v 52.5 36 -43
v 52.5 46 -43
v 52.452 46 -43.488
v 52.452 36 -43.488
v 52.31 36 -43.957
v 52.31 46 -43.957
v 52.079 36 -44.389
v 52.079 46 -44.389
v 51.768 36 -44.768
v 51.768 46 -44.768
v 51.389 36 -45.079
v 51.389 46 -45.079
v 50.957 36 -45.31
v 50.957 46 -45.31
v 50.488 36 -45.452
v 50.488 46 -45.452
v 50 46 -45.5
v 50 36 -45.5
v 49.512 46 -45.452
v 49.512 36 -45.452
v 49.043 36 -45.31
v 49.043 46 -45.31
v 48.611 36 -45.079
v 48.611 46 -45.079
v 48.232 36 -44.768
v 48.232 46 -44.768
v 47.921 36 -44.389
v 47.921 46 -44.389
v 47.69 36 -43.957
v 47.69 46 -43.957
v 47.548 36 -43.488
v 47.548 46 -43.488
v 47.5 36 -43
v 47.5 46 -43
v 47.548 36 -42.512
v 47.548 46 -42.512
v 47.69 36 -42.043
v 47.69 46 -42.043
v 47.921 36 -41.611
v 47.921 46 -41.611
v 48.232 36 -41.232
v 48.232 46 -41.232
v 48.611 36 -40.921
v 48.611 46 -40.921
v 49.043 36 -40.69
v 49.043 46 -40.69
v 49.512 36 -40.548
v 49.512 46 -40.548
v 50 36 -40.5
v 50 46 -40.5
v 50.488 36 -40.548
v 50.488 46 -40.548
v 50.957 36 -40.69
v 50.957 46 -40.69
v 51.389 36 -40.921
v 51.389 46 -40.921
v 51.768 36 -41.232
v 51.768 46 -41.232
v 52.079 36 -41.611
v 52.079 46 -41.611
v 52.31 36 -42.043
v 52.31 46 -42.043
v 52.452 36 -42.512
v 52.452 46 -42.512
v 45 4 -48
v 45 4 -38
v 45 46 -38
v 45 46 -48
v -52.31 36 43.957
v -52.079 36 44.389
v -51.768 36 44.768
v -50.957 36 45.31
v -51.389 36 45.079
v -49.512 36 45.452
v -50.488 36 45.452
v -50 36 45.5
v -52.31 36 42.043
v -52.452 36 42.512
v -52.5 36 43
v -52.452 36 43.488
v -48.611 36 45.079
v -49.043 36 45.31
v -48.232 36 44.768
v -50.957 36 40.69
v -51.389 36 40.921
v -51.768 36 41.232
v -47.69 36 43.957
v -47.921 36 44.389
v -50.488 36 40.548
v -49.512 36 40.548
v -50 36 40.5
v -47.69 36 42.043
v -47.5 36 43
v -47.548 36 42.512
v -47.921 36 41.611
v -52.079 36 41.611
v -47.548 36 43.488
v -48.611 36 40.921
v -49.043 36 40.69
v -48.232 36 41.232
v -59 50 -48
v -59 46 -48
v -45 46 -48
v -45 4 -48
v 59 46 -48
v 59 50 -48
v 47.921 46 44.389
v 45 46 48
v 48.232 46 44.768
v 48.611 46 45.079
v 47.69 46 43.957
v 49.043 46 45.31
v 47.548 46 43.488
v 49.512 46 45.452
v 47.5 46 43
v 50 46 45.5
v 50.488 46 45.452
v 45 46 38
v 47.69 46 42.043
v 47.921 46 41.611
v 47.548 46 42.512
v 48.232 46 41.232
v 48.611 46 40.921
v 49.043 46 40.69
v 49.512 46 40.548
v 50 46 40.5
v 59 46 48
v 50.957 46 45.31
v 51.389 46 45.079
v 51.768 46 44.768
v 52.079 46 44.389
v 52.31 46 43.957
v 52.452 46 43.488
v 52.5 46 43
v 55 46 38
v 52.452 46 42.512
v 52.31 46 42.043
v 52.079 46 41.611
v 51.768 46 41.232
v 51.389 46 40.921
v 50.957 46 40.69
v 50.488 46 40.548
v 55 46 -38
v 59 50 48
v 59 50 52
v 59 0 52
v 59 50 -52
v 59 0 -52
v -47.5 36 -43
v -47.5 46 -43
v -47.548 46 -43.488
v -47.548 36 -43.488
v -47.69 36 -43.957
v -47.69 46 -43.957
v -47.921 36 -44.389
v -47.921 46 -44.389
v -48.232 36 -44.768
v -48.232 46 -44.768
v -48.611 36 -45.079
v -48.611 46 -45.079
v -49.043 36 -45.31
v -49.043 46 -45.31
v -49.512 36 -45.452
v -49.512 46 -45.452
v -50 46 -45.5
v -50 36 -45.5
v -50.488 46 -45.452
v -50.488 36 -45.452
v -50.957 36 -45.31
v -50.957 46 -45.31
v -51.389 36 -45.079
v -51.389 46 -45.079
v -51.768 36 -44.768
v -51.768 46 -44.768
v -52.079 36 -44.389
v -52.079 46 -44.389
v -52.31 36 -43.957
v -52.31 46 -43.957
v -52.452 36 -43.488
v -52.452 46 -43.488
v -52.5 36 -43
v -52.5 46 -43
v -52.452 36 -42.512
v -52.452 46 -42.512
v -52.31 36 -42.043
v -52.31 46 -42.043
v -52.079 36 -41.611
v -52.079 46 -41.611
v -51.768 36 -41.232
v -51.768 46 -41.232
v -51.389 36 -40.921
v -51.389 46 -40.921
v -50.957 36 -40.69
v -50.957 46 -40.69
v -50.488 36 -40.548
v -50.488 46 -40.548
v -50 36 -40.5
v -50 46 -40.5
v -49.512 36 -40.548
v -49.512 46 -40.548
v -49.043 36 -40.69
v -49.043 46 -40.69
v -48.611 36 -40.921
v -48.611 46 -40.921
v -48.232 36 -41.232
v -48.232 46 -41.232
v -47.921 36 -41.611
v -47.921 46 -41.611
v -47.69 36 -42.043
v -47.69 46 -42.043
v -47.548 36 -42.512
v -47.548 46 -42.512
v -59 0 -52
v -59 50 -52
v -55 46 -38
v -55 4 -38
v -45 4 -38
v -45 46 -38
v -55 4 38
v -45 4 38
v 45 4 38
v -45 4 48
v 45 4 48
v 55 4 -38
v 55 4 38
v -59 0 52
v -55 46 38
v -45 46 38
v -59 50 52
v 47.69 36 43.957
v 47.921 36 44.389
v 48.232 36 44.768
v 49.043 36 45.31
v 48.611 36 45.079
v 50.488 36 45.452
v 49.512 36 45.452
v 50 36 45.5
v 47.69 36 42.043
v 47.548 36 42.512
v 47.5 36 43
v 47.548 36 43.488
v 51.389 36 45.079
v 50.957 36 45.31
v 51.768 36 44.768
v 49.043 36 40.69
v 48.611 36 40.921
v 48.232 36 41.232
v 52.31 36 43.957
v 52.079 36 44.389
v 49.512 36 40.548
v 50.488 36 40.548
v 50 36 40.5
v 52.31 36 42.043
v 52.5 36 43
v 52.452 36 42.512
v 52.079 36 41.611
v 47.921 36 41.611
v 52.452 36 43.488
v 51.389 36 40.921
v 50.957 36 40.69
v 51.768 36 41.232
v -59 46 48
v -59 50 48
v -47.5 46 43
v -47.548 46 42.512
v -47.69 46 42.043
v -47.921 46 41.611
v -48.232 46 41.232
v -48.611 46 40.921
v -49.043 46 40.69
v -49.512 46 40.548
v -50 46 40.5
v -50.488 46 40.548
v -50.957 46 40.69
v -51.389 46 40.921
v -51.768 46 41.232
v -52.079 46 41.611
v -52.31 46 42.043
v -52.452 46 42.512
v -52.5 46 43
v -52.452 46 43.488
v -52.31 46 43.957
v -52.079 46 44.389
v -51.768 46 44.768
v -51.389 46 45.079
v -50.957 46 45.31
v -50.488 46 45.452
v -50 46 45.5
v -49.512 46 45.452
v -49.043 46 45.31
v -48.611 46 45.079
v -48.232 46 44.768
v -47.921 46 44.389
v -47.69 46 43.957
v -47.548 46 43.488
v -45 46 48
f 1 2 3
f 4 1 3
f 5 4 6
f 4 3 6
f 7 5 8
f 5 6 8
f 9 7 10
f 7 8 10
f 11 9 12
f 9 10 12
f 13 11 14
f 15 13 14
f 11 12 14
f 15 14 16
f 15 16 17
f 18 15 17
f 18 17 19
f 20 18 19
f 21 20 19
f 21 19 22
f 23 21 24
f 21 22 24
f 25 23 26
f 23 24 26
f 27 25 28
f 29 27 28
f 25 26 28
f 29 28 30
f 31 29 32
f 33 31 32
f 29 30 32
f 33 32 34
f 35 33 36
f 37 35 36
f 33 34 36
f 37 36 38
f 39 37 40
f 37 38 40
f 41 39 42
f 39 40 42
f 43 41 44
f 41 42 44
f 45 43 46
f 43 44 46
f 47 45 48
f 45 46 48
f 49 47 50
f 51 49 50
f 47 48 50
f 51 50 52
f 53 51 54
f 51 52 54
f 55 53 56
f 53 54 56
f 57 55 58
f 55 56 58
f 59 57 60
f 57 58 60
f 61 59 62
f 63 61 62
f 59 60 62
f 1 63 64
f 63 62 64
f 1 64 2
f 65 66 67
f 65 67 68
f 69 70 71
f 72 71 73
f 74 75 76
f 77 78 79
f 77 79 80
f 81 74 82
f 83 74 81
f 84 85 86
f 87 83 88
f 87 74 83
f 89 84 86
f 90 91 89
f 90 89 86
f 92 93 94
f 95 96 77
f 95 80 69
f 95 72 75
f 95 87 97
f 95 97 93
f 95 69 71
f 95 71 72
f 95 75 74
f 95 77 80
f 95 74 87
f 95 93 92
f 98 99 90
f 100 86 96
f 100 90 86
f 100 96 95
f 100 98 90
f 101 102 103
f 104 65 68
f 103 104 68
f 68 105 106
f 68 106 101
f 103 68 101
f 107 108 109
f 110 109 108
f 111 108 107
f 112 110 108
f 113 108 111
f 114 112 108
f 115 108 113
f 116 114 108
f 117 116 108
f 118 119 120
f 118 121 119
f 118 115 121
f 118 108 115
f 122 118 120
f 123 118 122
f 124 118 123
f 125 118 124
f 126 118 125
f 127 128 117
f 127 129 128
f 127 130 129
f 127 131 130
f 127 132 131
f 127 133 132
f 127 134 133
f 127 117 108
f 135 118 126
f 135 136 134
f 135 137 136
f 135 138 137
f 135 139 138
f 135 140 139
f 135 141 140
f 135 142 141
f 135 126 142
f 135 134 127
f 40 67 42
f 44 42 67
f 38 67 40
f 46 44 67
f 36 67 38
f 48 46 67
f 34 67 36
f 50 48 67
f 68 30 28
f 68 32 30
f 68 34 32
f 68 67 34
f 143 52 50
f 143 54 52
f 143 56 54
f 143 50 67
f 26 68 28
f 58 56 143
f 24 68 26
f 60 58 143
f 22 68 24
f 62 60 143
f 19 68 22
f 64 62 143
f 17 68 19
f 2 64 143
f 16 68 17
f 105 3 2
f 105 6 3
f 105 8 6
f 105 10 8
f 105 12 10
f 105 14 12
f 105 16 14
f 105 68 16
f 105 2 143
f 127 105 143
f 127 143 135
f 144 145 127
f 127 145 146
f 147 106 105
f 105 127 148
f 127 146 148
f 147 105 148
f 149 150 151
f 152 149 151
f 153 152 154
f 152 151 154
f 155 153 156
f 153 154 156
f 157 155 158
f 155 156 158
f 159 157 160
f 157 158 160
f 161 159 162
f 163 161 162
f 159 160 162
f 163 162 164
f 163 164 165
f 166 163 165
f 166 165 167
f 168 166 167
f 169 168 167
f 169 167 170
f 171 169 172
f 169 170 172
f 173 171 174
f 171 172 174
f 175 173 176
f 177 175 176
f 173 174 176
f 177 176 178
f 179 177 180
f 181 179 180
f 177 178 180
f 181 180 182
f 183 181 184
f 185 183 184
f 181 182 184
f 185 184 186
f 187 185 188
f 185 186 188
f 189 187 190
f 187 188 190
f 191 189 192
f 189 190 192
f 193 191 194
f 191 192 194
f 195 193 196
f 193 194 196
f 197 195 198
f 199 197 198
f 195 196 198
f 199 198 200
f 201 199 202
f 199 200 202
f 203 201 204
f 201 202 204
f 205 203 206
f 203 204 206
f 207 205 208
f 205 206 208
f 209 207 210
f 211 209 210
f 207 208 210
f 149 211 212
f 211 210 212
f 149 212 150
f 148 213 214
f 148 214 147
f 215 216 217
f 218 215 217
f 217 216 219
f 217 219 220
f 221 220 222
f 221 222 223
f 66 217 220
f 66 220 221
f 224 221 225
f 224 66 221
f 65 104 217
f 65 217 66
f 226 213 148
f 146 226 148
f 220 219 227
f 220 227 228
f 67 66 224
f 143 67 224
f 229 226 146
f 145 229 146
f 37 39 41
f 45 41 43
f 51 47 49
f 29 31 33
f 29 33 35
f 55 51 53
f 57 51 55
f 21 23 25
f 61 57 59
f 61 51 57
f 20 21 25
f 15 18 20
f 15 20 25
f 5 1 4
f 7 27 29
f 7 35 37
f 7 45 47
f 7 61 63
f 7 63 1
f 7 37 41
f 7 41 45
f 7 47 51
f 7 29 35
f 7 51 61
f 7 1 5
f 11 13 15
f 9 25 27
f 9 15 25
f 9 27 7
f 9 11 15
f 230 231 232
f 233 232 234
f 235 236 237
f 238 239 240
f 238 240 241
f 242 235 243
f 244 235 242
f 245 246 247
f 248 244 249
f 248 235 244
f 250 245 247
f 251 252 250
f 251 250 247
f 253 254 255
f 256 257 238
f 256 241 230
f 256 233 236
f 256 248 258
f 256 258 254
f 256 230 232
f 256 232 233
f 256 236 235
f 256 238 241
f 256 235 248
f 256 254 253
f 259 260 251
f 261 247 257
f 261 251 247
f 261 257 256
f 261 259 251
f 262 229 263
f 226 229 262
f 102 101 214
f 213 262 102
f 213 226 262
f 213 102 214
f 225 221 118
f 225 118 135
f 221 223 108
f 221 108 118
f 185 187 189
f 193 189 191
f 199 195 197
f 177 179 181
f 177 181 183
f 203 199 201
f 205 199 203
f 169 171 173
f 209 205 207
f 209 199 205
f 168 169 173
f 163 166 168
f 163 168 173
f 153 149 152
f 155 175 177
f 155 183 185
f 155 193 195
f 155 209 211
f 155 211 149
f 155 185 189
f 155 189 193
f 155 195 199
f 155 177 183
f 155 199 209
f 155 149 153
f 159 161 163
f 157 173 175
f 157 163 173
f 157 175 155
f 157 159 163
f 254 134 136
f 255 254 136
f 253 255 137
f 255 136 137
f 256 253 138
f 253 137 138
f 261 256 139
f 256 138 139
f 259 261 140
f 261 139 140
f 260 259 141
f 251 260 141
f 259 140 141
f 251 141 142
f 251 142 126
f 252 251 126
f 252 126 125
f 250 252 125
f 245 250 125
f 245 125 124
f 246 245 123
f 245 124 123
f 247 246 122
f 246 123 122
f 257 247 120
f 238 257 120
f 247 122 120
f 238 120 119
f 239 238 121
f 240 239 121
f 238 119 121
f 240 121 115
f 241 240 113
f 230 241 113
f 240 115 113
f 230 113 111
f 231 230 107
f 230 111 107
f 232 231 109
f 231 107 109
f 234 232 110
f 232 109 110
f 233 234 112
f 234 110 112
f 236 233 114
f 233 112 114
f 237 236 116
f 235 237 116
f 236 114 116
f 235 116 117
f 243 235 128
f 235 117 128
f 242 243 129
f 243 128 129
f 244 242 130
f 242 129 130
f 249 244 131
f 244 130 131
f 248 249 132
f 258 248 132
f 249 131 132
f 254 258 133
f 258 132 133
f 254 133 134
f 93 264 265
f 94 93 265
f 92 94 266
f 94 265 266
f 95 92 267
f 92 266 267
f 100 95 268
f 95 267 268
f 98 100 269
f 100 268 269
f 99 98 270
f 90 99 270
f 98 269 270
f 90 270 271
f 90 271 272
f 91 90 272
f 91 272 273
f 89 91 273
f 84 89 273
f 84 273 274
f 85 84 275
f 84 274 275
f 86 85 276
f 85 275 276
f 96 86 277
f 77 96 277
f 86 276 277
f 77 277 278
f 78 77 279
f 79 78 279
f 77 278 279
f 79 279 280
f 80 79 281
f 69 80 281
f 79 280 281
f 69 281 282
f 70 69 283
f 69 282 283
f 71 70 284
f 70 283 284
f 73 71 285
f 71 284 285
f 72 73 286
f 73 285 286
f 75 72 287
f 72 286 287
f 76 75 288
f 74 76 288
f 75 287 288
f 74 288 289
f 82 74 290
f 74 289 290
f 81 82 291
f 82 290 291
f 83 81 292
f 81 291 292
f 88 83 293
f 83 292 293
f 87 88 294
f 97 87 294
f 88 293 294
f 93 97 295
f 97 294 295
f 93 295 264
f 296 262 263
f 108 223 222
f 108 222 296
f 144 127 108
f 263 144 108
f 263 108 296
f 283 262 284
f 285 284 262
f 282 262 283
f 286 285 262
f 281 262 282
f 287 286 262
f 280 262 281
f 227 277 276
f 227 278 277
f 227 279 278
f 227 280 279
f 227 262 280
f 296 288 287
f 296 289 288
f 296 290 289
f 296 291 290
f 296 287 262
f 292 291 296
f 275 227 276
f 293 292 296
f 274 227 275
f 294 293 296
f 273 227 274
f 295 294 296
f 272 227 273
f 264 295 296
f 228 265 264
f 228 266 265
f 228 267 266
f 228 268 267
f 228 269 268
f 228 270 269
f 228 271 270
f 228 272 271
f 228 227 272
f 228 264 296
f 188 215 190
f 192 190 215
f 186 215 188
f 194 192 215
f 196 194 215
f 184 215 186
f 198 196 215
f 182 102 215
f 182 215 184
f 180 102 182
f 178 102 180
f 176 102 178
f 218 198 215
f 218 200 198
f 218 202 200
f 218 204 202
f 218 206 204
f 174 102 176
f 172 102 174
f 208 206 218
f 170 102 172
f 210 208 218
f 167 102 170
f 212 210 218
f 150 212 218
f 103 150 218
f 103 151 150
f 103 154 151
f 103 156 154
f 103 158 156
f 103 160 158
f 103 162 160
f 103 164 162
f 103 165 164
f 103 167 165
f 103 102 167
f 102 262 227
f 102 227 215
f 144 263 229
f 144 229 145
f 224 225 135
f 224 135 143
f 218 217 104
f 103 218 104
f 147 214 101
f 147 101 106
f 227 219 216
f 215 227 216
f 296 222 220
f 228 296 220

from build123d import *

# Parameters (mm, degrees)
SKETCH1_W               = 118
SKETCH1_H               = 104
SKETCH1_W_2             = 110
SKETCH1_H_2             = 96
BOSS_EXTRUDE1_DEPTH     = 50
SKETCH1_2_W             = 118
SKETCH1_2_H             = 104
BOSS_EXTRUDE2_DEPTH     = 4
SKETCH2_W               = 96
SKETCH2_H               = 4
CUT_EXTRUDE1_DEPTH      = 1
CUT_EXTRUDE1_DEPTH_BACK = 119
SKETCH3_W               = 10
SKETCH3_H               = 10
BOSS_EXTRUDE3_DEPTH     = 42
SKETCH4_R               = 2.5
CUT_EXTRUDE2_DEPTH      = 10


with BuildPart() as part:
    # Sketch1 → Boss-Extrude1 (new body)
    with BuildSketch(Plane(origin=(0, 0, 0), x_dir=(1, 0, 0), z_dir=(0, 1, 0))):
        Rectangle(SKETCH1_W, SKETCH1_H)
        Rectangle(SKETCH1_W_2, SKETCH1_H_2, mode=Mode.SUBTRACT)
    extrude(amount=BOSS_EXTRUDE1_DEPTH)

    # Sketch1<2> → Boss-Extrude2 (add)
    with BuildSketch(Plane(origin=(0, 0, 0), x_dir=(1, 0, 0), z_dir=(0, 1, 0))):
        Rectangle(SKETCH1_2_W, SKETCH1_2_H)
    extrude(amount=BOSS_EXTRUDE2_DEPTH)

    # Sketch2 → Cut-Extrude1 (cut, two sides)
    with BuildSketch(Plane(origin=(59, 0, 0), x_dir=(0, 0, -1), z_dir=(1, 0, 0))) as cut_extrude1_sk:
        with Locations((0, 48)):
            Rectangle(SKETCH2_W, SKETCH2_H)
    extrude(amount=CUT_EXTRUDE1_DEPTH, mode=Mode.SUBTRACT)
    extrude(cut_extrude1_sk.sketch, amount=-CUT_EXTRUDE1_DEPTH_BACK, mode=Mode.SUBTRACT)

    # Sketch3 → Boss-Extrude3 (add)
    with BuildSketch(Plane(origin=(0, 4, 0), x_dir=(1, 0, 0), z_dir=(0, 1, 0))):
        with Locations((-50, 43)):
            Rectangle(SKETCH3_W, SKETCH3_H)
        with Locations((-50, -43)):
            Rectangle(SKETCH3_W, SKETCH3_H)
        with Locations((50, -43)):
            Rectangle(SKETCH3_W, SKETCH3_H)
        with Locations((50, 43)):
            Rectangle(SKETCH3_W, SKETCH3_H)
    extrude(amount=BOSS_EXTRUDE3_DEPTH)

    # Sketch4 → Cut-Extrude2 (cut)
    with BuildSketch(Plane(origin=(0, 46, 0), x_dir=(1, 0, 0), z_dir=(0, 1, 0))):
        with Locations((-50, 43)):
            Circle(SKETCH4_R)
        with Locations((50, 43)):
            Circle(SKETCH4_R)
        with Locations((50, -43)):
            Circle(SKETCH4_R)
        with Locations((-50, -43)):
            Circle(SKETCH4_R)
    extrude(amount=-CUT_EXTRUDE2_DEPTH, mode=Mode.SUBTRACT)


solid = part.part
